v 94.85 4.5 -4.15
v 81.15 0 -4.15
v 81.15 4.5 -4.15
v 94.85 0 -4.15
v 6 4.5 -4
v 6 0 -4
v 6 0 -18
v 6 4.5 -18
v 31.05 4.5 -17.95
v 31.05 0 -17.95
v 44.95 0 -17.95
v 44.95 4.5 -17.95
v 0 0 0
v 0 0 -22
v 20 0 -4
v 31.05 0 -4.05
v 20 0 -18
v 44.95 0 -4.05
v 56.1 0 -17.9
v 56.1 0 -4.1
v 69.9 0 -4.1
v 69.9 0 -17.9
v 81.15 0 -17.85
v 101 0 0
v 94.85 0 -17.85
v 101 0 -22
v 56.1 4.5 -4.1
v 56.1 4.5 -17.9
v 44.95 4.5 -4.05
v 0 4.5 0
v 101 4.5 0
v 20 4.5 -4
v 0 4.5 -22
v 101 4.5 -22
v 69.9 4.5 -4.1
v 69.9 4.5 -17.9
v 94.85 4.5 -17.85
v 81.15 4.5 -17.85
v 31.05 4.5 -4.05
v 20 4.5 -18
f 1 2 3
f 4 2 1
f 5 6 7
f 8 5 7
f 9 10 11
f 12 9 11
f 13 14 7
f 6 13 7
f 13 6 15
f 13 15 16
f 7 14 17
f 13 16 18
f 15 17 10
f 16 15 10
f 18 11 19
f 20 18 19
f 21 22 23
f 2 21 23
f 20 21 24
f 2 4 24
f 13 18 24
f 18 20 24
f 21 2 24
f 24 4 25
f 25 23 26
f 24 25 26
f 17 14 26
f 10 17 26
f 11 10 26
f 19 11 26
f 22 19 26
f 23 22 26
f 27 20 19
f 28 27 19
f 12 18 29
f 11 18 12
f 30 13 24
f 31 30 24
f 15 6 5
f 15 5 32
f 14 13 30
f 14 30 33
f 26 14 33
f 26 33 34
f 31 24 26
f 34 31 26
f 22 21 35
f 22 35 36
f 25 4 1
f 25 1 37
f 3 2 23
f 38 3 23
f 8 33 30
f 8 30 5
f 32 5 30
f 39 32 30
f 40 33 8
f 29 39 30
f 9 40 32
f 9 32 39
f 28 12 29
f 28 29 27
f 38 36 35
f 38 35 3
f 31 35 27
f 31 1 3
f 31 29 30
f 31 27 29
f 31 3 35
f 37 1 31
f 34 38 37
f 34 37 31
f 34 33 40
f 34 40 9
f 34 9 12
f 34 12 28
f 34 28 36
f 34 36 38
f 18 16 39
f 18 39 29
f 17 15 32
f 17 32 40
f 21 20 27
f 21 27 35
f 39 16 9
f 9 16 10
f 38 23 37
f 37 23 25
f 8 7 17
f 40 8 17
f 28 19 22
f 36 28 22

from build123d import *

# Parameters (mm, degrees)
SKETCH3_W           = 101
SKETCH3_H           = 22
SKETCH3_W_2         = 14
SKETCH3_H_2         = 14
SKETCH3_W_3         = 13.9
SKETCH3_H_3         = 13.9
SKETCH3_W_4         = 13.8
SKETCH3_H_4         = 13.8
SKETCH3_W_5         = 13.7
SKETCH3_H_5         = 13.7
BOSS_EXTRUDE5_DEPTH = 4.5


with BuildPart() as part:
    # Sketch3 → Boss-Extrude5 (new body)
    with BuildSketch(Plane(origin=(0, 0, 0), x_dir=(1, 0, 0), z_dir=(0, 1, 0))):
        with Locations((50.5, 11)):
            Rectangle(SKETCH3_W, SKETCH3_H)
        with Locations((13, 11)):
            Rectangle(SKETCH3_W_2, SKETCH3_H_2, mode=Mode.SUBTRACT)
        with Locations((38, 11)):
            Rectangle(SKETCH3_W_3, SKETCH3_H_3, mode=Mode.SUBTRACT)
        with Locations((63, 11)):
            Rectangle(SKETCH3_W_4, SKETCH3_H_4, mode=Mode.SUBTRACT)
        with Locations((88, 11)):
            Rectangle(SKETCH3_W_5, SKETCH3_H_5, mode=Mode.SUBTRACT)
    extrude(amount=BOSS_EXTRUDE5_DEPTH)


solid = part.part
